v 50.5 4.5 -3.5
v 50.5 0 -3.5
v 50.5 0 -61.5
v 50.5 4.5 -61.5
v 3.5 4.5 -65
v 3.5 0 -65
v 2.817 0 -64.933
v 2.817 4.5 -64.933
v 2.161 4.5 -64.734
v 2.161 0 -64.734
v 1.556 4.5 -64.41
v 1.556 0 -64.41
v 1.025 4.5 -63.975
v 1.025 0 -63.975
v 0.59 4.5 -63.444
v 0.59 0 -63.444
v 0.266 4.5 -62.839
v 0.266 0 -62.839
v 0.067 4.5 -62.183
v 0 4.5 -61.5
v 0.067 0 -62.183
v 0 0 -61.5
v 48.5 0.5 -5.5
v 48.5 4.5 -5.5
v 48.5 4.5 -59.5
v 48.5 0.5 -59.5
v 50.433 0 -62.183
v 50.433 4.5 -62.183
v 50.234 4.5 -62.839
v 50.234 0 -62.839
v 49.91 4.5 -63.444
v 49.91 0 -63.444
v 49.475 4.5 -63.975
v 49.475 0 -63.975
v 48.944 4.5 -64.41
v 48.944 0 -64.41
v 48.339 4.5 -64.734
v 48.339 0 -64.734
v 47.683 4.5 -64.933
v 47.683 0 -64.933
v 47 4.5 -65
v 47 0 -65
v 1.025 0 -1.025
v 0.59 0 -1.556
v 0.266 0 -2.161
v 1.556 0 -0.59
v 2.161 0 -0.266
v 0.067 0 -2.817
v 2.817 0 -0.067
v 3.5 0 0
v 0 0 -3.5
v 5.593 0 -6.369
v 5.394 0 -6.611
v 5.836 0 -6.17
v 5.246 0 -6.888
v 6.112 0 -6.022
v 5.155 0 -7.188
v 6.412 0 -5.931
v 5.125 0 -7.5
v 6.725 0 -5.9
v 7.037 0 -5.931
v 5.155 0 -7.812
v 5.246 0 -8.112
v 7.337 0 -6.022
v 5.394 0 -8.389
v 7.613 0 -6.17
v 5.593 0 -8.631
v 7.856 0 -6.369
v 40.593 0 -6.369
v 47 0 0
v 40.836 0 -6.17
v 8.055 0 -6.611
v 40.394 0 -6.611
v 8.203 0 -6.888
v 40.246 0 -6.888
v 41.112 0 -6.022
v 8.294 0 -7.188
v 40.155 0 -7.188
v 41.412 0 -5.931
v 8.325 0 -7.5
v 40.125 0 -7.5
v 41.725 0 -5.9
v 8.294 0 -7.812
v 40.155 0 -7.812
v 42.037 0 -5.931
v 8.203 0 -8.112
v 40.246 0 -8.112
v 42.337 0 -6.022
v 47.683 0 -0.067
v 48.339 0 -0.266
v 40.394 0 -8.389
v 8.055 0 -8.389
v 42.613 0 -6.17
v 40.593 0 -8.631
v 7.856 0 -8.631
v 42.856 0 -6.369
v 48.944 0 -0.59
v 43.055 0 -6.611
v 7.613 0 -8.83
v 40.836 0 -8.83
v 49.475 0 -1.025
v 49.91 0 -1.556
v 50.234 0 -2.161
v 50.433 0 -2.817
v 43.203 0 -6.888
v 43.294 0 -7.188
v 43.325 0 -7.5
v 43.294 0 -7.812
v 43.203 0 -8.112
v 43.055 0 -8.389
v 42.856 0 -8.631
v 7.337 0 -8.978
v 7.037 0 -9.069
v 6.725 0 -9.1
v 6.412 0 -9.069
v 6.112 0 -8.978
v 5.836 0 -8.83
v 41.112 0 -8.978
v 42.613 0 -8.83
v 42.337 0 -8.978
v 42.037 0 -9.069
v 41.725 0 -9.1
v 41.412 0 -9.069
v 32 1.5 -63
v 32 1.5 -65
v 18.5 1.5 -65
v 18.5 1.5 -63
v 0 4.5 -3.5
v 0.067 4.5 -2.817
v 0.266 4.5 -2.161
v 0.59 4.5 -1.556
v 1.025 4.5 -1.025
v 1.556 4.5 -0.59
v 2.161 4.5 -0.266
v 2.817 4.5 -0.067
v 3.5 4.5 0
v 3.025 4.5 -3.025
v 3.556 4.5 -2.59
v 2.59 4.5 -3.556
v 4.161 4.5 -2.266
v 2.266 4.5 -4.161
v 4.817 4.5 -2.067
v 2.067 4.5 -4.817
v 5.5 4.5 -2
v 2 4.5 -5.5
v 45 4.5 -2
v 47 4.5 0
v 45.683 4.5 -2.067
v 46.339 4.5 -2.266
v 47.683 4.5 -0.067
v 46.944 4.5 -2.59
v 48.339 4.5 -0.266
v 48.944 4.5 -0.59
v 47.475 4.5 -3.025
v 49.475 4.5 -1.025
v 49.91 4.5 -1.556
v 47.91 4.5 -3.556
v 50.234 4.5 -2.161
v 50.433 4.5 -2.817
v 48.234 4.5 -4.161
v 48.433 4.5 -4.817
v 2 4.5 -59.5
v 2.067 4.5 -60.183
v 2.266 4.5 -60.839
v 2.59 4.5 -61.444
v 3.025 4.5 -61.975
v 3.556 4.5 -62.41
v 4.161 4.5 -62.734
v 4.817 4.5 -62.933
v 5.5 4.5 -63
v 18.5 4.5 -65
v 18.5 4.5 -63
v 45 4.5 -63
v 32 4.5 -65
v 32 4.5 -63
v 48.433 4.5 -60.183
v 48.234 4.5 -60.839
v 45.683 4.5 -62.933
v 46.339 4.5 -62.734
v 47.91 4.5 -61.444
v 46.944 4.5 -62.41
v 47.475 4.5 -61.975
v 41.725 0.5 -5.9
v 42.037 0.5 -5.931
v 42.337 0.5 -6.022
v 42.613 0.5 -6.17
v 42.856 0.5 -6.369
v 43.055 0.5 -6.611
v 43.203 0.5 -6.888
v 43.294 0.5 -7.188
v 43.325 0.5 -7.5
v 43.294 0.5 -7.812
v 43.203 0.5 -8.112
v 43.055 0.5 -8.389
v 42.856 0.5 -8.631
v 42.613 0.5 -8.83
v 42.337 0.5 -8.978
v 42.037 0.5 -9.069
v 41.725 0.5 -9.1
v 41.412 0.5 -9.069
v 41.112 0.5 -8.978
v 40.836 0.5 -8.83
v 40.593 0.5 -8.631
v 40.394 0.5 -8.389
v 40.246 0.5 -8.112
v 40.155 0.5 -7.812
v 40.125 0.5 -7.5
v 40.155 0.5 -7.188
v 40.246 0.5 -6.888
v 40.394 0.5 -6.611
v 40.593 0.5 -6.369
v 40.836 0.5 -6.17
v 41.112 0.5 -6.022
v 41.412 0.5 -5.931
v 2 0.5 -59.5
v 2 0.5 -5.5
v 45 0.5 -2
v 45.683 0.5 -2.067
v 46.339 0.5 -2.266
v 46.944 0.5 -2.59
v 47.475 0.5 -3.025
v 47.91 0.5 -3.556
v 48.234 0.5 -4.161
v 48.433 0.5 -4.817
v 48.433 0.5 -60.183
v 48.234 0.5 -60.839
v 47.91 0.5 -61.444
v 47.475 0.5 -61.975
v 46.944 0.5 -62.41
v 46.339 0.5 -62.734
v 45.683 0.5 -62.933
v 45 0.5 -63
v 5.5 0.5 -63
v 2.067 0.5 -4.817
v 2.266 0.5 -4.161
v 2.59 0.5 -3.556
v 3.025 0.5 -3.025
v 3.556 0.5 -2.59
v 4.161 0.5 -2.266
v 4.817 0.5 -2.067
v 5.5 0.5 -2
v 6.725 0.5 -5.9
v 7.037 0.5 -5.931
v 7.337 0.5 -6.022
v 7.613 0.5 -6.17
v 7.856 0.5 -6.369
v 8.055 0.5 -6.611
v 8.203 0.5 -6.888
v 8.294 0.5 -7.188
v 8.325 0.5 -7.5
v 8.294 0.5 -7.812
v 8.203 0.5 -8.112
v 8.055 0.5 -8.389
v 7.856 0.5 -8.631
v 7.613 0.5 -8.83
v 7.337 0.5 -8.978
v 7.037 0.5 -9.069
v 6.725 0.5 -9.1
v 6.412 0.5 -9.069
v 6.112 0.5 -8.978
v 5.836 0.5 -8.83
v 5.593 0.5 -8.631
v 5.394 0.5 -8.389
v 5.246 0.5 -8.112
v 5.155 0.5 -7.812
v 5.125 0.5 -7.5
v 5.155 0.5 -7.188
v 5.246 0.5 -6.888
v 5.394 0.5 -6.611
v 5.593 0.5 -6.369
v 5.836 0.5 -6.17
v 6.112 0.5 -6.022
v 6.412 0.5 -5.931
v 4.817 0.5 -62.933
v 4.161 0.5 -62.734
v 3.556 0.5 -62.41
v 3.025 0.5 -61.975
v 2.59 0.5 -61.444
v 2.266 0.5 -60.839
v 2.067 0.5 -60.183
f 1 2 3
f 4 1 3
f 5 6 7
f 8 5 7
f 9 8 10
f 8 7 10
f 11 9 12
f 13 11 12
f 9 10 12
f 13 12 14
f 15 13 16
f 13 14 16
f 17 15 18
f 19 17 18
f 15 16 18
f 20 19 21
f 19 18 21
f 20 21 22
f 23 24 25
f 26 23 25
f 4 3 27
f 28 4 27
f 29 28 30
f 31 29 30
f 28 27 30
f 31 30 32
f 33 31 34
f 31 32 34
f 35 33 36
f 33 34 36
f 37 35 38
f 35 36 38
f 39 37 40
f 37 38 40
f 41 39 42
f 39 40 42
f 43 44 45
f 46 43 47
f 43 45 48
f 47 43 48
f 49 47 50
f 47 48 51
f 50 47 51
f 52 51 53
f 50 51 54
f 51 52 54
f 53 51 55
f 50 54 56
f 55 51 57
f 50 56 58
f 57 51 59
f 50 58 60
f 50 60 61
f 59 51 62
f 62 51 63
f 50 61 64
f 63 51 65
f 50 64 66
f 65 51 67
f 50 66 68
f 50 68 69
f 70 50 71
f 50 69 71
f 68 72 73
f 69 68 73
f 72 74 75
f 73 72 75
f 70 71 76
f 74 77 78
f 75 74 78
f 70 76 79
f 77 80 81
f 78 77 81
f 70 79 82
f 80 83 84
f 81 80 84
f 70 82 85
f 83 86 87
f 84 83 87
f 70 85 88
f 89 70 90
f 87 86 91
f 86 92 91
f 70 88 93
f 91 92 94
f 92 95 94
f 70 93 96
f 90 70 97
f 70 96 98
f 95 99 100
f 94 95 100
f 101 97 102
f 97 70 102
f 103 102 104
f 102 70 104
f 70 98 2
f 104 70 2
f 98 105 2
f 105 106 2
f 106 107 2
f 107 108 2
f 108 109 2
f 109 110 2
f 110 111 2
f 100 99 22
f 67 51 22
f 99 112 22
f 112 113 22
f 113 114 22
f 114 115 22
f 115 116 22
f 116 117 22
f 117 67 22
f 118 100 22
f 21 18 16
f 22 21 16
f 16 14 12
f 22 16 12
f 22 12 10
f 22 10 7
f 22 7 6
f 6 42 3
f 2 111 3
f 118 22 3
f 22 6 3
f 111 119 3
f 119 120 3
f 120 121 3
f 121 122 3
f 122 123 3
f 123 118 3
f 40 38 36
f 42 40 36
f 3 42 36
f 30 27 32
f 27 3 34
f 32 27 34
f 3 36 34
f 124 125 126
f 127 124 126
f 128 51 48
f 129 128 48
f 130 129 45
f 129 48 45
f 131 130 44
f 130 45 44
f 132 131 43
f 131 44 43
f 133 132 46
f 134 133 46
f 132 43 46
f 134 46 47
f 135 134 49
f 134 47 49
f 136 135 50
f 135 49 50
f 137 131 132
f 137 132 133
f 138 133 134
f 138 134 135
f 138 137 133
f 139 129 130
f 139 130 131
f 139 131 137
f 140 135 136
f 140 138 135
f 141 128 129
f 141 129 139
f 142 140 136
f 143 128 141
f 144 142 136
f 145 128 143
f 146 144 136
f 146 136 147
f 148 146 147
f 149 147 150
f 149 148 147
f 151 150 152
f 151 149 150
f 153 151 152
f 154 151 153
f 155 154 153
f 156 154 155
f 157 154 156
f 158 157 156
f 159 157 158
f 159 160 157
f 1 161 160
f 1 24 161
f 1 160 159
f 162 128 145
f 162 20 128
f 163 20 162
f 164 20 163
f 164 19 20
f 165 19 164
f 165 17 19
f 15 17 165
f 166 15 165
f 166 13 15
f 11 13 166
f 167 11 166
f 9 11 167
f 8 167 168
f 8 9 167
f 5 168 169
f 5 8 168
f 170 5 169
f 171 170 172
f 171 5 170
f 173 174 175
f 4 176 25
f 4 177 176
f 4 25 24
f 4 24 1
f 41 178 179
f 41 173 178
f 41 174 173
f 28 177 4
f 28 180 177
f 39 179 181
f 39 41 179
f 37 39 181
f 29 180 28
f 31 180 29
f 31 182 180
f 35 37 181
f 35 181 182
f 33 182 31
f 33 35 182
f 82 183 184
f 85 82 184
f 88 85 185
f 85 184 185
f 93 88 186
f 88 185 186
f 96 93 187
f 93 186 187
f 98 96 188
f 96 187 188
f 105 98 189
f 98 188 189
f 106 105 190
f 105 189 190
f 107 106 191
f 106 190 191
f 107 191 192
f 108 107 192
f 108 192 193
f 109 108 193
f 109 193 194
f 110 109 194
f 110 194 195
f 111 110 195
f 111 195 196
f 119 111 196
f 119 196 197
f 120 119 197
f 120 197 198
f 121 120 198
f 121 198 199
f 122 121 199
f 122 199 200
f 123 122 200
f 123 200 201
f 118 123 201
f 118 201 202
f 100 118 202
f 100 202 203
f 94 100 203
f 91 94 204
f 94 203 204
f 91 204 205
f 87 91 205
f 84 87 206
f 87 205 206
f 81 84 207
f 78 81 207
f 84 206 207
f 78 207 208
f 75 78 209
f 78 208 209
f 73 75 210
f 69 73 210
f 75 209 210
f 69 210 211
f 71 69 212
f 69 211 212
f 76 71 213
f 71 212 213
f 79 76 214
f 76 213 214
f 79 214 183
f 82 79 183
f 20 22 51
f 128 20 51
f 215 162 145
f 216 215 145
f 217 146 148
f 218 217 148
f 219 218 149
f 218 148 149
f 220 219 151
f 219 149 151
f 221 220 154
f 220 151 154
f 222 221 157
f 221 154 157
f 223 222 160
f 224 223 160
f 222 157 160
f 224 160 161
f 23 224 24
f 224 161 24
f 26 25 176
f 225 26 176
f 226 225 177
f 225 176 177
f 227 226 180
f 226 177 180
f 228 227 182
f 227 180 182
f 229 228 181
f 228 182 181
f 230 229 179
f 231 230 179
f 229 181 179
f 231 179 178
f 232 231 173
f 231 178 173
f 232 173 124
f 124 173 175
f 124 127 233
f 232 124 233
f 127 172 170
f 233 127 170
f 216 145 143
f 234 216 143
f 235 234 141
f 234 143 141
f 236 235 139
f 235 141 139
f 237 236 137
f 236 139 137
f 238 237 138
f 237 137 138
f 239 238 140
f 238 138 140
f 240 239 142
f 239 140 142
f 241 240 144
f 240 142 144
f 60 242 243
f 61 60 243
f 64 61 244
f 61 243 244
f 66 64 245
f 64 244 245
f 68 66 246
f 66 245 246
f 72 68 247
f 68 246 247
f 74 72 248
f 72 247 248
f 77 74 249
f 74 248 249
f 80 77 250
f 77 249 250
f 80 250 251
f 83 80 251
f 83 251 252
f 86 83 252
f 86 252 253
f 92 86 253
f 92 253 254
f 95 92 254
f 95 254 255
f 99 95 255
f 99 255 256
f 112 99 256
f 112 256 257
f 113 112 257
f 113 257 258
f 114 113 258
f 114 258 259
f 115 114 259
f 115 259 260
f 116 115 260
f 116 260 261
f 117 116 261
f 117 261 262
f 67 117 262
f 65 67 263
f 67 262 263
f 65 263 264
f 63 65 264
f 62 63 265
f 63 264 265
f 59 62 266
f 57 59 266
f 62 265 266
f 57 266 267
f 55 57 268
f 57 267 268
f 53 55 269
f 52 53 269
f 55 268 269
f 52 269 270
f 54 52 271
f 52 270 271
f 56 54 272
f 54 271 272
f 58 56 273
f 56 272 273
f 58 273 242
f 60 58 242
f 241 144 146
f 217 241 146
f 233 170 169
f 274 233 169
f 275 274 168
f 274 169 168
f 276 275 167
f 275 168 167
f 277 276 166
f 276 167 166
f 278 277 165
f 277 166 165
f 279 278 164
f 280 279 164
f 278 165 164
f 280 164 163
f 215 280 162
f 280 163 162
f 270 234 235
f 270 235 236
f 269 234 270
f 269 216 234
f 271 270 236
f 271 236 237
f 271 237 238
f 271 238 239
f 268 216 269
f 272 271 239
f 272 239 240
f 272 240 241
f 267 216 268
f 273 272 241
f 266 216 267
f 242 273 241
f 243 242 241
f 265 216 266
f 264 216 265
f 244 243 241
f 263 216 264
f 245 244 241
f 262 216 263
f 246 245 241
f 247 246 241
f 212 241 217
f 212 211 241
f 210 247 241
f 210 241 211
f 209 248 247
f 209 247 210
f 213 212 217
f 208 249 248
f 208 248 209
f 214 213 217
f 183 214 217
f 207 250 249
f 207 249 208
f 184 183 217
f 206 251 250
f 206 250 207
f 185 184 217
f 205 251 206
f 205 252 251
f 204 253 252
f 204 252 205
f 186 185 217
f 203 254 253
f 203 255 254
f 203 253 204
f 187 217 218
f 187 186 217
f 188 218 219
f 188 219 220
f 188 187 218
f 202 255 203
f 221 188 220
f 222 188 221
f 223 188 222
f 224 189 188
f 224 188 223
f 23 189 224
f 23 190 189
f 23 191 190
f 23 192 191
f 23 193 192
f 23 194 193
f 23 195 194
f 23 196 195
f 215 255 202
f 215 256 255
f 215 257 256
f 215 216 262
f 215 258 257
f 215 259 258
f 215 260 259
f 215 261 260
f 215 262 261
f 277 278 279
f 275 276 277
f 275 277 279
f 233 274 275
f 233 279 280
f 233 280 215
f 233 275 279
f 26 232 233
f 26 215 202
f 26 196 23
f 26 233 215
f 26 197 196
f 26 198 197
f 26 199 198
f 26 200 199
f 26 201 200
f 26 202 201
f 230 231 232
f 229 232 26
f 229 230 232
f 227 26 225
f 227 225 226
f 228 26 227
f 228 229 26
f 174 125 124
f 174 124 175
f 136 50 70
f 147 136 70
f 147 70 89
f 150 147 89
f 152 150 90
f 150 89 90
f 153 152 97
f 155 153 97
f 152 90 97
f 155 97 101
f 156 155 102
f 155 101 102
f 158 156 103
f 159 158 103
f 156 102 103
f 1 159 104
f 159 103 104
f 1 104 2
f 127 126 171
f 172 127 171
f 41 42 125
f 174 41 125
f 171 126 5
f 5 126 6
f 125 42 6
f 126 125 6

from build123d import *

# Parameters (mm, degrees)
BOSS_EXTRUDE1_DEPTH = 4.5
CUT_EXTRUDE1_DEPTH  = 4
SKETCH3_W           = 13.5
SKETCH3_H           = 6
CUT_EXTRUDE3_DEPTH  = 15
SKETCH4_R           = 1.6
CUT_EXTRUDE4_DEPTH  = 40


with BuildPart() as part:
    # Sketch1 → Boss-Extrude1 (new body)
    with BuildSketch(Plane(origin=(0, 0, 0), x_dir=(1, 0, 0), z_dir=(0, 1, 0))):
        with BuildLine():
            Line((3.5, 0), (47, 0))
            ThreePointArc((47, 0), (49.474873734, 1.025126266), (50.5, 3.5))
            Line((50.5, 3.5), (50.5, 61.5))
            ThreePointArc((50.5, 61.5), (49.474873734, 63.974873734), (47, 65))
            Line((47, 65), (3.5, 65))
            ThreePointArc((3.5, 65), (1.025126266, 63.974873734), (0, 61.5))
            Line((0, 61.5), (0, 3.5))
            ThreePointArc((0, 3.5), (1.025126266, 1.025126266), (3.5, 0))
        make_face()
    extrude(amount=BOSS_EXTRUDE1_DEPTH)

    # Sketch2 → Cut-Extrude1 (cut)
    with BuildSketch(Plane(origin=(0, 4.5, 0), x_dir=(1, 0, 0), z_dir=(0, 1, 0))):
        with BuildLine():
            Line((5.5, 2), (45, 2))
            ThreePointArc((45, 2), (47.474873734, 3.025126266), (48.5, 5.5))
            Line((48.5, 5.5), (48.5, 59.5))
            ThreePointArc((48.5, 59.5), (47.474873734, 61.974873734), (45, 63))
            Line((45, 63), (5.5, 63))
            ThreePointArc((5.5, 63), (3.025126266, 61.974873734), (2, 59.5))
            Line((2, 59.5), (2, 5.5))
            ThreePointArc((2, 5.5), (3.025126266, 3.025126266), (5.5, 2))
        make_face()
    extrude(amount=-CUT_EXTRUDE1_DEPTH, mode=Mode.SUBTRACT)

    # Sketch3 → Cut-Extrude3 (cut)
    with BuildSketch(Plane(origin=(0, 0, -65), x_dir=(-1, 0, 0), z_dir=(0, 0, -1))):
        with Locations((-25.25, 4.5)):
            Rectangle(SKETCH3_W, SKETCH3_H)
    extrude(amount=-CUT_EXTRUDE3_DEPTH, mode=Mode.SUBTRACT)

    # Sketch4 → Cut-Extrude4 (cut)
    with BuildSketch(Plane(origin=(0, 0.5, 0), x_dir=(1, 0, 0), z_dir=(0, 1, 0))):
        with Locations(Location((6.724572176, 7.5, 0), (0, 0, 270))):
            Circle(SKETCH4_R)
        with Locations(Location((41.724572176, 7.5, 0), (0, 0, 270))):
            Circle(SKETCH4_R)
    extrude(amount=-CUT_EXTRUDE4_DEPTH, mode=Mode.SUBTRACT)


solid = part.part
